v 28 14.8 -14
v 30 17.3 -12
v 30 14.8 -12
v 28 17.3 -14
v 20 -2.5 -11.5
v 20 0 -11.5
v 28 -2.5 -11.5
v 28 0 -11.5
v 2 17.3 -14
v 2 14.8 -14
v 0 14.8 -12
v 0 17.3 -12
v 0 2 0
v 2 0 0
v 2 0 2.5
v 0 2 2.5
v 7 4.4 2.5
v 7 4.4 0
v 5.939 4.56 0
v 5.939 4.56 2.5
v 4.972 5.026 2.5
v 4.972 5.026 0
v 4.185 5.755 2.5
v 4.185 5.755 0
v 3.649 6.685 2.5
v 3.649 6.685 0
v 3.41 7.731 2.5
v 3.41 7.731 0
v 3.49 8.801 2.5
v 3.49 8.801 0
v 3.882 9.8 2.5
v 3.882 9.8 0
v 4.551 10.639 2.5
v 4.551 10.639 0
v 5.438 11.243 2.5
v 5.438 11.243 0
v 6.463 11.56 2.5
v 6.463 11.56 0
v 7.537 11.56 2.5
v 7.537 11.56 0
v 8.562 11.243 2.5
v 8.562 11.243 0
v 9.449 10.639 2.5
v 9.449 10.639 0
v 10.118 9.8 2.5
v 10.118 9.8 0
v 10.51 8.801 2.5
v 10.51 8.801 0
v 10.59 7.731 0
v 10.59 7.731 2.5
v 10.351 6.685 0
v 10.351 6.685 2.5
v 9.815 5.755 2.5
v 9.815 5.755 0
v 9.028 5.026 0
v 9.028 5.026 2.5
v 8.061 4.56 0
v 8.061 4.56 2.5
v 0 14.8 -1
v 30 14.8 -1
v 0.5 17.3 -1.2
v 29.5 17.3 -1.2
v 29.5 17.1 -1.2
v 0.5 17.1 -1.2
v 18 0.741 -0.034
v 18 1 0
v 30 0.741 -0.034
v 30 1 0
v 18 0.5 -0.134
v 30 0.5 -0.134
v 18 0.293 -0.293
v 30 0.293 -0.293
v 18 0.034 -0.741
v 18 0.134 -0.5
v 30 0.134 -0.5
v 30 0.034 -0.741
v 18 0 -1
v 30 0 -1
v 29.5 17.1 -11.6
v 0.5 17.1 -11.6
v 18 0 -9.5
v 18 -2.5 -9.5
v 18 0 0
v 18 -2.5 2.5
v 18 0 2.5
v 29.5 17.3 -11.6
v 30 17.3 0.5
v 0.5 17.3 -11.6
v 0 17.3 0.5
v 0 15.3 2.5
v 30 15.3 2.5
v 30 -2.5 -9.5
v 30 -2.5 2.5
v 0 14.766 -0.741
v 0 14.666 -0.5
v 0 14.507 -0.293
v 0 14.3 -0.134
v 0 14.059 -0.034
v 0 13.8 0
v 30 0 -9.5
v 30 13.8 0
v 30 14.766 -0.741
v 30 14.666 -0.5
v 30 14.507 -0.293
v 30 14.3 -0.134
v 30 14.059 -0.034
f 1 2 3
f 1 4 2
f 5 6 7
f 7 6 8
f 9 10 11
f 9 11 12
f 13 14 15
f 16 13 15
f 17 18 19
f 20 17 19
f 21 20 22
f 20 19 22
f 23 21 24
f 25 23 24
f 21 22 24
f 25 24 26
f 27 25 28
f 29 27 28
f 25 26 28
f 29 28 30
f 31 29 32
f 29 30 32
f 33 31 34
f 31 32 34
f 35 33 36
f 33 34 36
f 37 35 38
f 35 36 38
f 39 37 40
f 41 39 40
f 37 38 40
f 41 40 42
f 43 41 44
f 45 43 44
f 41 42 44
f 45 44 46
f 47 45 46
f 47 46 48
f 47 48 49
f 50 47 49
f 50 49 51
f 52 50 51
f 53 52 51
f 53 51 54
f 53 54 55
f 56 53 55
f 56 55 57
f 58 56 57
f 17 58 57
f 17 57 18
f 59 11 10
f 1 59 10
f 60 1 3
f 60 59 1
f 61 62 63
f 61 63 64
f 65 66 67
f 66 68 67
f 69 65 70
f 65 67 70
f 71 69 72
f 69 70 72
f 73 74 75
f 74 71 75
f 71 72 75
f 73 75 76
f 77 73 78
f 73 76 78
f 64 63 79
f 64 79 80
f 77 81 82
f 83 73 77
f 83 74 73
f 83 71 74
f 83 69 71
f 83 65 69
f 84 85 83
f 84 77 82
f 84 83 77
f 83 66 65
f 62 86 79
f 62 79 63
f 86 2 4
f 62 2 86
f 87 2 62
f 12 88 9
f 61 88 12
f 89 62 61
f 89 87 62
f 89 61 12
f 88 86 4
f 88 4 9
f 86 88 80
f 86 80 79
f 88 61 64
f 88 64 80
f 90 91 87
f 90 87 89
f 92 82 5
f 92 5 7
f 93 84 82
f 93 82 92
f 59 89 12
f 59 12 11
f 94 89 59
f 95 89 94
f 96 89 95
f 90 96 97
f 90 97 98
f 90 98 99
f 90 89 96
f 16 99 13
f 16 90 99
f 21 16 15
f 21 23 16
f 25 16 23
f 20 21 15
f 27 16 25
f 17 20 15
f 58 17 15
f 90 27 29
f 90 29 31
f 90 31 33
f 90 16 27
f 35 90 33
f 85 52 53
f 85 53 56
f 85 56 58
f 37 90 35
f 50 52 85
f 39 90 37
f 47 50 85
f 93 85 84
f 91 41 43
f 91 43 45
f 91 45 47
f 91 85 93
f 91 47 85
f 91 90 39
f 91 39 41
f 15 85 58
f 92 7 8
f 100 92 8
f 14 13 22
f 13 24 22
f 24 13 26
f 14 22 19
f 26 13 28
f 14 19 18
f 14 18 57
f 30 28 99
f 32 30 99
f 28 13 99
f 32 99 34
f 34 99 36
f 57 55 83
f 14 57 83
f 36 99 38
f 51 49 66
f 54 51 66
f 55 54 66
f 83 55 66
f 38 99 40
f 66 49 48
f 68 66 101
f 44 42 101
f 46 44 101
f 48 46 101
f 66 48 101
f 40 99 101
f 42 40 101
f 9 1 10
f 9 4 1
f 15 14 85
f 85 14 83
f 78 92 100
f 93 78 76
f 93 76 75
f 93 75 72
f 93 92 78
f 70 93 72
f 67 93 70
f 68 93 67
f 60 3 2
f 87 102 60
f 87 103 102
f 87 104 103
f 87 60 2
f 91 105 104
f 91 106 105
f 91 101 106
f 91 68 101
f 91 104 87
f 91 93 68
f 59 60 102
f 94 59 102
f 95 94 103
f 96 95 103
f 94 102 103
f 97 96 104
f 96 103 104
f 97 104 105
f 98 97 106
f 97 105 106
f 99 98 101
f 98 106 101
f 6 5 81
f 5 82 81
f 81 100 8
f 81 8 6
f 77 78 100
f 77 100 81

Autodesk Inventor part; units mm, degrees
ref_plane "YZ Plane" through (0, 0, 0) normal (1, 0, 0) x (0, 1, 0)
ref_plane "XZ Plane" through (0, 0, 0) normal (0, 1, 0) x (-1, 0, 0)
ref_plane "XY Plane" through (0, 0, 0) normal (0, 0, 1) x (1, 0, 0)
sketch "Sketch1" plane through (0, 0, 0) normal (0, 0, 1) x (1, 0, 0)
  line L0 (0, 0) -> (30, 0)
  line L1 (30, 0) -> (30, 17.3)
  line L2 (30, 17.3) -> (0, 17.3)
  line L3 (0, 17.3) -> (0, 0)
  dimension "d0" = 30
  dimension "d1" = 17.3
extrude "Extrusion1" add sketch "Sketch1" along normal blind 2.5
sketch "Sketch2" plane through (0, 0, 2.5) normal (0, 0, 1) x (1, 0, 0)
  line L0 (0, 17.3) -> (0, 0) projected
  line L1 (0, 0) -> (30, 0) projected
  point P0 (7, 8)
  dimension "d4" = 7
  dimension "d12" = 8
hole "Hole1" at (7, 8, 2.5) direction (0, 0, -1) diameter 7.2 end through all
sketch "Sketch3" plane through (0, 0, 2.5) normal (0, 0, 1) x (1, 0, 0)
  line L0 (30, 0) -> (30, 17.3) projected
  line L1 (30, 0) -> (18, 0)
  line L2 (18, 0) -> (18, -2.5)
  line L3 (18, -2.5) -> (30, -2.5)
  line L4 (30, -2.5) -> (30, 0)
  point P0 (0, 0)
  dimension "d13" = 2.5
  dimension "d14" = 12
extrude "Extrusion2" add sketch "Sketch3" against normal blind 14
sketch "Sketch4" plane through (18, 0, 0) normal (0, 1, 0) x (1, 0, 0)
  line L0 (3.25, 3) -> (8.75, 3)
  line L1 (8.75, 3) -> (8.75, 8.5)
  line L2 (8.75, 8.5) -> (3.25, 8.5)
  line L3 (3.25, 8.5) -> (3.25, 3)
  line L4 (0, 0) -> (0, 11.5) projected
  line L5 (0, 11.5) -> (12, 11.5) projected
  point P0 (-18, 0)
  point P1 (3.25, 5.75)
  point P2 (0, 5.75)
  point P3 (6, 8.5)
  point P4 (6, 11.5)
  dimension "d17" = 5.5
extrude "Extrusion3" [suppressed]
fillet "Fillet1" [suppressed]
fillet "Fillet2" [suppressed]
fillet "Fillet3" radius 1 1 edges at (24, 0, 0)
sketch "Sketch5" plane through (0, 0, 0) normal (0, 0, -1) x (-1, 0, 0)
  line L0 (-30, 17.3) -> (0, 17.3) projected
  line L1 (-30, 1) -> (-30, 17.3) projected
  line L2 (0, 17.3) -> (0, 0) projected
  line L3 (-30, -2.5) -> (-30, 17.3) projected
  line L4 (0, 14.8) -> (-30, 14.8)
  point P0 (0, 2)
  dimension "d26" = 2.5
extrude "Extrusion4" add sketch "Sketch5" along normal blind 14
chamfer "Chamfer2" distance 2 angle 45 6 edges at (0, 0, 1.25) (18, -1.25, -11.5) (0, 16.05, -14) (30, 16.05, -14) (15, 17.3, 2.5) (30, -1.25, -11.5)
fillet "Fillet4" radius 1 1 edges at (15, 14.8, 0)
sketch "Sketch6" plane through (0, 17.3, 0.5) normal (0, 1, 0) x (1, 0, 0)
  line L0 (29.5, 12.1) -> (0.5, 12.1)
  line L1 (0.5, 12.1) -> (0.5, 1.7)
  line L2 (0.5, 1.7) -> (29.5, 1.7)
  line L3 (29.5, 1.7) -> (29.5, 12.1)
  line L4 (0, 12.5) -> (0, 0) projected
  line L5 (30, 12.5) -> (30, 0) projected
  line L6 (2, 14.5) -> (28, 14.5) projected
  point P0 (0, 0.5)
  dimension "d33" = 10.4
  dimension "d34" = 0.5
  dimension "d36" = 0.5
  dimension "d37" = 2.4
emboss "Emboss1" sketch "Sketch6" operation cut depth 0.2 direction (0, -1, 0)
properties part number "GF1002 mount"
